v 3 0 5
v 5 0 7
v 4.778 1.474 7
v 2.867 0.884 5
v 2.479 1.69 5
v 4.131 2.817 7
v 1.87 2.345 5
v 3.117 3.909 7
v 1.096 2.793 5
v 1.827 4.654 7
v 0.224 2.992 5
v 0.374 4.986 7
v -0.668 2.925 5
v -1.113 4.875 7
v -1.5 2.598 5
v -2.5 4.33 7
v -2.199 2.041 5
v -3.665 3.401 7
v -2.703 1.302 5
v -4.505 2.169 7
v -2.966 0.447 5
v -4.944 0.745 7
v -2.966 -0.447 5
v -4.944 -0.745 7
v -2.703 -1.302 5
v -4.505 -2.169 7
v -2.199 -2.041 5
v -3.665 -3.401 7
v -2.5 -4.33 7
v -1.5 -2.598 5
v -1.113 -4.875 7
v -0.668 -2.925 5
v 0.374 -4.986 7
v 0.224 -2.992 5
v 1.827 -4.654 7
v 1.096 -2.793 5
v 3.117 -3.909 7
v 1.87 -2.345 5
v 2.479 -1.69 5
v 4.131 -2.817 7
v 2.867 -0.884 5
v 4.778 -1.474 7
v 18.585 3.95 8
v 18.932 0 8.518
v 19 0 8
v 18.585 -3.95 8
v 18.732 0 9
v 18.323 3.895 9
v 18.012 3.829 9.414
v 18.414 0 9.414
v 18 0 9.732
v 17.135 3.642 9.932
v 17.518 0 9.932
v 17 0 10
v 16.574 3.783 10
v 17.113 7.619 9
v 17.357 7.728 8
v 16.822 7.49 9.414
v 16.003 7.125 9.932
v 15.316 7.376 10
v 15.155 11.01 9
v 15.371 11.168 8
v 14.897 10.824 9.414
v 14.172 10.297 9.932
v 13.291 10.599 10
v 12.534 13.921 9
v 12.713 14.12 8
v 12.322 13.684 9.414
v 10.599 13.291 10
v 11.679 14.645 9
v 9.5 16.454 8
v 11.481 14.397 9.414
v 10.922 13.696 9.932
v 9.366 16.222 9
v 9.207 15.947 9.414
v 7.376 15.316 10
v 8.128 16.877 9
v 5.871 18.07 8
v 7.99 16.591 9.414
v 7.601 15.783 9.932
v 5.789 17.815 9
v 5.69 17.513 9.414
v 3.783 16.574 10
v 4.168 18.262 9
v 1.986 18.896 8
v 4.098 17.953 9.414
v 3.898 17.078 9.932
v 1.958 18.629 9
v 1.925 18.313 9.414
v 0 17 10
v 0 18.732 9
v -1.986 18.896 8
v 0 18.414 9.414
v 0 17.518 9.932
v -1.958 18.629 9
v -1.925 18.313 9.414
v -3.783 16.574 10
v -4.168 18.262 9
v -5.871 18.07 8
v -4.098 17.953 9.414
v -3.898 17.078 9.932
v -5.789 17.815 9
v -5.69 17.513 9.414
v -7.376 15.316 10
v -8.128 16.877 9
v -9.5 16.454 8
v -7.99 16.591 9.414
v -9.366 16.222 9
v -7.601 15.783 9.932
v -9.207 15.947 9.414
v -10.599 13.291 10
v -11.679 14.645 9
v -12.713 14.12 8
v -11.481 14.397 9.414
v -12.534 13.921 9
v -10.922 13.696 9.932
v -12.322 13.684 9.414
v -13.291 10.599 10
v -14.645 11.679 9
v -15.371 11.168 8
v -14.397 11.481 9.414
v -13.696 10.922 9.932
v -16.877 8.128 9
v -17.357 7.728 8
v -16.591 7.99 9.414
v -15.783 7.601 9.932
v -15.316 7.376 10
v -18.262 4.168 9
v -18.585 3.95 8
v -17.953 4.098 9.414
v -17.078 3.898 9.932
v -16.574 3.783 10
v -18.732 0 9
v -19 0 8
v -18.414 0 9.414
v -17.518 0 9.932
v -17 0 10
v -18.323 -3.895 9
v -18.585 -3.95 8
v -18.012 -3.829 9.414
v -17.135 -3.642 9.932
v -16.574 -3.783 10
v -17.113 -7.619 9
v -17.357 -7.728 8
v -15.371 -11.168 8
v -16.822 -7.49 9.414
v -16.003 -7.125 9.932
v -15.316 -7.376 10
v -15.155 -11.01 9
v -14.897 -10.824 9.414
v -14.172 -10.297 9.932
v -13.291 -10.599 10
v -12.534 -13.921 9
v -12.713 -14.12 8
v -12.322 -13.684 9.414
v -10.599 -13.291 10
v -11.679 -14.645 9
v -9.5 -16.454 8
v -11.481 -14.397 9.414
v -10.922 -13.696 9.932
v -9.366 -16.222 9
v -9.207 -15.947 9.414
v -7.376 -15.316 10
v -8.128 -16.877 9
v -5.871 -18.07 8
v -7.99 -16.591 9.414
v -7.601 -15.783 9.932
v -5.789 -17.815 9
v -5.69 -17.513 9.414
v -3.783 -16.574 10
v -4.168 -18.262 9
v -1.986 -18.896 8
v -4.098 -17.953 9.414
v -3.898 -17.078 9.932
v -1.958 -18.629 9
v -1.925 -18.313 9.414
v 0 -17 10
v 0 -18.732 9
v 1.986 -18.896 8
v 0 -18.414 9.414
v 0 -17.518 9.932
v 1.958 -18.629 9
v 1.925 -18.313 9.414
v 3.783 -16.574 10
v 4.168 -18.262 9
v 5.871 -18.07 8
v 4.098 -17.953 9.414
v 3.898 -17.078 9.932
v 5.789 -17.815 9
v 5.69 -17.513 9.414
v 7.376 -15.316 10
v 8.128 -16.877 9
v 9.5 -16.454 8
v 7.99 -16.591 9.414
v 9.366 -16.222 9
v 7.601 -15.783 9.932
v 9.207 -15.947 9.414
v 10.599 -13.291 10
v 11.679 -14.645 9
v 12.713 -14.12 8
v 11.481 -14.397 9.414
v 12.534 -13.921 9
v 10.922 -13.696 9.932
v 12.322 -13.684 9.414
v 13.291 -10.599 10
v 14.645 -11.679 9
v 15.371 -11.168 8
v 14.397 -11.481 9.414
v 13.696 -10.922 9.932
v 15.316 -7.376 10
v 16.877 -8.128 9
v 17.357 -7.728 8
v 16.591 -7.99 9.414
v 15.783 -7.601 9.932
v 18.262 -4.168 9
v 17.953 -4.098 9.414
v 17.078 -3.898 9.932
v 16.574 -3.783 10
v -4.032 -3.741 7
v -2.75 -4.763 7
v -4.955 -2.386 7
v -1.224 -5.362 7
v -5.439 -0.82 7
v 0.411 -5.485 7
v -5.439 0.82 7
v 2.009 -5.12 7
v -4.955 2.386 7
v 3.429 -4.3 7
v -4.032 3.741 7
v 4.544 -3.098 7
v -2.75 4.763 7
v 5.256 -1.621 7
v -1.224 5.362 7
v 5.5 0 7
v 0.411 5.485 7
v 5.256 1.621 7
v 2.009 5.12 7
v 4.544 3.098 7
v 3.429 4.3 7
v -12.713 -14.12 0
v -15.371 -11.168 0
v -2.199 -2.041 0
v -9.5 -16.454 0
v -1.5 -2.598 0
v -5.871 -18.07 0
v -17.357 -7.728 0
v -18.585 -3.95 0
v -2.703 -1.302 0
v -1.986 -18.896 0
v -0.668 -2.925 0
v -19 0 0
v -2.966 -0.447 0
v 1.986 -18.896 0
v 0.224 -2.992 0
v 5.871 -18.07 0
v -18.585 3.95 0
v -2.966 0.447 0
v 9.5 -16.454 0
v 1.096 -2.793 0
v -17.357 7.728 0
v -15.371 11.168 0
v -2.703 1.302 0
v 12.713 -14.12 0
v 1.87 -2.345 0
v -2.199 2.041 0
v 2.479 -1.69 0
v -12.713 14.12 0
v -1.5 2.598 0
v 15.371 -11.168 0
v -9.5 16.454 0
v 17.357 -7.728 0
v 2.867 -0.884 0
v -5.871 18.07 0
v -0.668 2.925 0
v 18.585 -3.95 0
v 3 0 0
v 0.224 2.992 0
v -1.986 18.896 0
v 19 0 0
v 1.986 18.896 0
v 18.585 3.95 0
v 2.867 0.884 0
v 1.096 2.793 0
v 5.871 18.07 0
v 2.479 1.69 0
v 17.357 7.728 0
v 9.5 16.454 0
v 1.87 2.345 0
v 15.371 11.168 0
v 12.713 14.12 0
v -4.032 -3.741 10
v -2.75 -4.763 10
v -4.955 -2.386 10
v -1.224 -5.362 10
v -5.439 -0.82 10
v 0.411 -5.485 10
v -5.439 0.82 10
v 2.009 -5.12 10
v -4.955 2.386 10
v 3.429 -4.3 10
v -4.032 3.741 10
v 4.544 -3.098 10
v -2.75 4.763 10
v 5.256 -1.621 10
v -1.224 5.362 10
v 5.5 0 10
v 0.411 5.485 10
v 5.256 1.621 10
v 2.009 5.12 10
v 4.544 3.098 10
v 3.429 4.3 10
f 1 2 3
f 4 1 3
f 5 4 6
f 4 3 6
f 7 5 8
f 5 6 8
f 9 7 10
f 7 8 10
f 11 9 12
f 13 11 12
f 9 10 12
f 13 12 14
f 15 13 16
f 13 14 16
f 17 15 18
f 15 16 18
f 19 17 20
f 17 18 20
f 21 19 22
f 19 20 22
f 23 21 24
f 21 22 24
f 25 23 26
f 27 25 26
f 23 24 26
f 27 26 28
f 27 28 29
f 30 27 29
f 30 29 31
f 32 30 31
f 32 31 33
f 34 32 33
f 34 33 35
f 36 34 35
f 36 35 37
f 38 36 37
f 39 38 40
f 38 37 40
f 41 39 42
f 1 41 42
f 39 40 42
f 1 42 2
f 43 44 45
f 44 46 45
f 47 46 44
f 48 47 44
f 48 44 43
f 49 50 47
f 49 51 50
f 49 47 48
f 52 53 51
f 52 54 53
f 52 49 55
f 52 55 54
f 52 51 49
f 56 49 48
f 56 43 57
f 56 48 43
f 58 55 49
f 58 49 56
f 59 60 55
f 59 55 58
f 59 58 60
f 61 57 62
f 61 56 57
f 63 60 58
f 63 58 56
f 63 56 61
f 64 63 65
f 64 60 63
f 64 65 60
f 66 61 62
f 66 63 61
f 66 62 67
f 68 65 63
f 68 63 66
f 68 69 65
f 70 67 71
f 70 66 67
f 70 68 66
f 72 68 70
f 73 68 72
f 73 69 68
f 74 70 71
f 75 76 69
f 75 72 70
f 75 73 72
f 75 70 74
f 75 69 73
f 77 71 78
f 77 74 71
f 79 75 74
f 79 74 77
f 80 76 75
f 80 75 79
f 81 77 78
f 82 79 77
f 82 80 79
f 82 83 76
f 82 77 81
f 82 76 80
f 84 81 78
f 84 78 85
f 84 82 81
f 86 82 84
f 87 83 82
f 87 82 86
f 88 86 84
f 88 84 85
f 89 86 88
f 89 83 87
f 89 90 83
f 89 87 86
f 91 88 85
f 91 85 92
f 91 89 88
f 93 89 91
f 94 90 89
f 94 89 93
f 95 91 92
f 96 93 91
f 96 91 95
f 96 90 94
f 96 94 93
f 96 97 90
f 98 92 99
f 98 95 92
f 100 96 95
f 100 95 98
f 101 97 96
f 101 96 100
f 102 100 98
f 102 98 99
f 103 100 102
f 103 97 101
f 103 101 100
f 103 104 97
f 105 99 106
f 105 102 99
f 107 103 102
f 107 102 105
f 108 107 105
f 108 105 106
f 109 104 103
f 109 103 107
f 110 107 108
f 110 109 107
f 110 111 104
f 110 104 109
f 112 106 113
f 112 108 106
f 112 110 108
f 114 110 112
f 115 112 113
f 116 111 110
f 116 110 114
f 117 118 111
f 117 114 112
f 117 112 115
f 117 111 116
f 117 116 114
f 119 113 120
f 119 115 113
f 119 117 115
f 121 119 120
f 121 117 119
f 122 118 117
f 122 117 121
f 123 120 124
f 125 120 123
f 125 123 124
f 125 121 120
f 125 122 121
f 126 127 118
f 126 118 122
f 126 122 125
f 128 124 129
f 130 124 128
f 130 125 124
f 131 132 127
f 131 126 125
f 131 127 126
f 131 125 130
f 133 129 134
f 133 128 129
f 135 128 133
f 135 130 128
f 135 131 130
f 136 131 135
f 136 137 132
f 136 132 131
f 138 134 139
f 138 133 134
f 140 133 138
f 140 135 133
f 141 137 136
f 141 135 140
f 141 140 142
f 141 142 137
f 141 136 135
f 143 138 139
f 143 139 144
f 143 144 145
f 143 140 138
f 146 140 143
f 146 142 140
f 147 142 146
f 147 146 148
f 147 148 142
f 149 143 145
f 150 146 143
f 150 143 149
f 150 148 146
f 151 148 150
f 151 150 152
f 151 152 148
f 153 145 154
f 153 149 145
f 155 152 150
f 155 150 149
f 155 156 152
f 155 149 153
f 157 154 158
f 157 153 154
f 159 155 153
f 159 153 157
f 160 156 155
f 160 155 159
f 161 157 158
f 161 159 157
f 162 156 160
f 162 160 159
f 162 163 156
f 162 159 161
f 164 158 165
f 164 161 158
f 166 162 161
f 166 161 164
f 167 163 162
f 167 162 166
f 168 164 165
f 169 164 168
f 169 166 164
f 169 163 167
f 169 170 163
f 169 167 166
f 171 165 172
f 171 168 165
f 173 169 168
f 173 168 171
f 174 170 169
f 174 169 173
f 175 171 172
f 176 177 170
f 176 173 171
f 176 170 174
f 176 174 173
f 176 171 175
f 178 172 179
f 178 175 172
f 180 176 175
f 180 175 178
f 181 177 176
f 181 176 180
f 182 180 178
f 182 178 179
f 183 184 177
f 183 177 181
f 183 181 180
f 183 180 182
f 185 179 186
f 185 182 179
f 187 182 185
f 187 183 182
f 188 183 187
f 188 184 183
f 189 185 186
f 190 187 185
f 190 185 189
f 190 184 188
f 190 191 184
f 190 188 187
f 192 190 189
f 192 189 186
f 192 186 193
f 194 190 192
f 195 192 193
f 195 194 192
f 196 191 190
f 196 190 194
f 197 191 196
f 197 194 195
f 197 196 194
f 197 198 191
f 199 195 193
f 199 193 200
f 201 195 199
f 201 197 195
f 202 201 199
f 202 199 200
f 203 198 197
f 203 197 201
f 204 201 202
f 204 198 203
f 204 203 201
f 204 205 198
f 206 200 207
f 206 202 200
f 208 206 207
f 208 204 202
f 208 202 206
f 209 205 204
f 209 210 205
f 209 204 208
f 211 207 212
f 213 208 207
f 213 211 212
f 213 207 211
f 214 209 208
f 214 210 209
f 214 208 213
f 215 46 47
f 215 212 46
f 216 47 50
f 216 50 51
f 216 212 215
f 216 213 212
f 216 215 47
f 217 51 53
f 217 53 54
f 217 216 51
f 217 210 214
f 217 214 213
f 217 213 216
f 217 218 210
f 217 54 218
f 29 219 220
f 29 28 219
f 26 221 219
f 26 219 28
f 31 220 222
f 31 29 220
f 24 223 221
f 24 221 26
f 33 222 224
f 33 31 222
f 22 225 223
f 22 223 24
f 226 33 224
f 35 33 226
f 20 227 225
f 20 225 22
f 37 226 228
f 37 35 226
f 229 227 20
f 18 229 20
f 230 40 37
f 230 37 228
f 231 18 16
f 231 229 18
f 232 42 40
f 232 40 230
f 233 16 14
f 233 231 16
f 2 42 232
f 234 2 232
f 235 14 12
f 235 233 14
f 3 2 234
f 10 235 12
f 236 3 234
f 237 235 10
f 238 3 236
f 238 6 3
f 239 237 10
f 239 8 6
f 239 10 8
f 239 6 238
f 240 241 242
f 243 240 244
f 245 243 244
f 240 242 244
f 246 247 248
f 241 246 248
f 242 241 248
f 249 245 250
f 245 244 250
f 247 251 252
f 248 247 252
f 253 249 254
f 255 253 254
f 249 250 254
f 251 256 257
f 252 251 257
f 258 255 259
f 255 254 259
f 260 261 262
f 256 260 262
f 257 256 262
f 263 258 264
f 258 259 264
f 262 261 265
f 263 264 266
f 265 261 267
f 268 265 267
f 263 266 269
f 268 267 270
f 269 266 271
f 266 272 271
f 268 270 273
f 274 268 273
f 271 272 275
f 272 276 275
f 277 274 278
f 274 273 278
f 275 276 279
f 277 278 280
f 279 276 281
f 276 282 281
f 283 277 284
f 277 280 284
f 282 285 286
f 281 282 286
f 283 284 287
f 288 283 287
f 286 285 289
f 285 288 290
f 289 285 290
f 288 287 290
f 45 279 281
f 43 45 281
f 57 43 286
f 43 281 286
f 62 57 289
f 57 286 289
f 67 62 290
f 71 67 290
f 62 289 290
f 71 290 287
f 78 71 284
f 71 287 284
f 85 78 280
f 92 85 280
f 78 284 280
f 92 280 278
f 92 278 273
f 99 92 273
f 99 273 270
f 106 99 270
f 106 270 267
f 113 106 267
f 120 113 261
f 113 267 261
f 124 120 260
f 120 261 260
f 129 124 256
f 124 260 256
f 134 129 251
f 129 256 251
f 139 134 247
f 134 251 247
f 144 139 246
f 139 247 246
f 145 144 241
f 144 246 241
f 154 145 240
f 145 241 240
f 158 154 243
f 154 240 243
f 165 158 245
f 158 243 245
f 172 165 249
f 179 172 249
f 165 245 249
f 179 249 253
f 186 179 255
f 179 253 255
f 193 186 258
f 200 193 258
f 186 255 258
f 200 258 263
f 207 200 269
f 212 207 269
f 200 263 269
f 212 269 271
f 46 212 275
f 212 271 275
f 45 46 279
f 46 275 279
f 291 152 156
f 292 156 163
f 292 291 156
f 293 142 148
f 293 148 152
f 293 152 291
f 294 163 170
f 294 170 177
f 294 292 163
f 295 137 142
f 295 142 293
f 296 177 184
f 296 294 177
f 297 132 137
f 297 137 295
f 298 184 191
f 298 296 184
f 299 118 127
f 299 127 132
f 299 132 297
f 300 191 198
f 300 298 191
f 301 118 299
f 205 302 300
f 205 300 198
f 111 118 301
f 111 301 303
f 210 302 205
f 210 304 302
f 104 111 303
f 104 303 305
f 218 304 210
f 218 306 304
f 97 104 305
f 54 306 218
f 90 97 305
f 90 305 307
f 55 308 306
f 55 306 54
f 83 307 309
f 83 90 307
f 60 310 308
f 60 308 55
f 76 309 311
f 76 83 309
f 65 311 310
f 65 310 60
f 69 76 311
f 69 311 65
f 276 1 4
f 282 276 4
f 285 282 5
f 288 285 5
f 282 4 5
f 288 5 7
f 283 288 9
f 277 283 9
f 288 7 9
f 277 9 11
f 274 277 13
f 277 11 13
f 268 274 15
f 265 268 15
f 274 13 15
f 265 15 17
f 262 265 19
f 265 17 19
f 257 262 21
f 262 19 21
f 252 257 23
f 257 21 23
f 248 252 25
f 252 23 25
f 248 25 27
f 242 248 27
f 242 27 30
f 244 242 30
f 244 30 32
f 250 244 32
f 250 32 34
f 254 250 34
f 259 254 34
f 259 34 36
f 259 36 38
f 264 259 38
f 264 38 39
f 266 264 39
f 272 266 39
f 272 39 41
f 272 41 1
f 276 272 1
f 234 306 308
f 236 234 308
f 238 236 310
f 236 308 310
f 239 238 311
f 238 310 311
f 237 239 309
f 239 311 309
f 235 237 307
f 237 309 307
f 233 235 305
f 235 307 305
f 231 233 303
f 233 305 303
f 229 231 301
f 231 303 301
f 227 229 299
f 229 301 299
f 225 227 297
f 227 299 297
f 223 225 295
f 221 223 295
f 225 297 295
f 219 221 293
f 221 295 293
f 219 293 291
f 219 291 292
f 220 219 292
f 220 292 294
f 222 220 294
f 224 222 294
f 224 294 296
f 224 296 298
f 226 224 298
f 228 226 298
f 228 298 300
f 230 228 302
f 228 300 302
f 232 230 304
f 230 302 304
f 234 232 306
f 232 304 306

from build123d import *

# Parameters (mm, degrees)
SKETCH_R        = 19
PAD_DEPTH       = 10
SKETCH001_R     = 3
POCKET_DEPTH    = 10.001
SKETCH002_R     = 5.5
POCKET001_DEPTH = 3
CHAMFER_SIZE    = 2
FILLET_R        = 2


with BuildPart() as part:
    # Sketch → Pad (new body)
    with BuildSketch(Plane.XY):
        Circle(SKETCH_R)
    extrude(amount=PAD_DEPTH)

    # Sketch001 (on Face3 of Pad) → Pocket (cut, through all)
    with BuildSketch(Plane.XY.offset(10)):
        Circle(SKETCH001_R)
    extrude(amount=-POCKET_DEPTH, mode=Mode.SUBTRACT)

    # Sketch002 (on Face3 of Pocket) → Pocket001 (cut)
    with BuildSketch(Plane.XY.offset(10)):
        Circle(SKETCH002_R)
    extrude(amount=-POCKET001_DEPTH, mode=Mode.SUBTRACT)

    # Chamfer
    chamfer_edges = [part.edges().sort_by_distance(p)[0] for p in [
        (-3, 0, 7),
    ]]
    chamfer(chamfer_edges, length=CHAMFER_SIZE)

    # Fillet
    fillet_edges = [part.edges().sort_by_distance(p)[0] for p in [
        (-19, 0, 10),
    ]]
    fillet(fillet_edges, radius=FILLET_R)


solid = part.part
